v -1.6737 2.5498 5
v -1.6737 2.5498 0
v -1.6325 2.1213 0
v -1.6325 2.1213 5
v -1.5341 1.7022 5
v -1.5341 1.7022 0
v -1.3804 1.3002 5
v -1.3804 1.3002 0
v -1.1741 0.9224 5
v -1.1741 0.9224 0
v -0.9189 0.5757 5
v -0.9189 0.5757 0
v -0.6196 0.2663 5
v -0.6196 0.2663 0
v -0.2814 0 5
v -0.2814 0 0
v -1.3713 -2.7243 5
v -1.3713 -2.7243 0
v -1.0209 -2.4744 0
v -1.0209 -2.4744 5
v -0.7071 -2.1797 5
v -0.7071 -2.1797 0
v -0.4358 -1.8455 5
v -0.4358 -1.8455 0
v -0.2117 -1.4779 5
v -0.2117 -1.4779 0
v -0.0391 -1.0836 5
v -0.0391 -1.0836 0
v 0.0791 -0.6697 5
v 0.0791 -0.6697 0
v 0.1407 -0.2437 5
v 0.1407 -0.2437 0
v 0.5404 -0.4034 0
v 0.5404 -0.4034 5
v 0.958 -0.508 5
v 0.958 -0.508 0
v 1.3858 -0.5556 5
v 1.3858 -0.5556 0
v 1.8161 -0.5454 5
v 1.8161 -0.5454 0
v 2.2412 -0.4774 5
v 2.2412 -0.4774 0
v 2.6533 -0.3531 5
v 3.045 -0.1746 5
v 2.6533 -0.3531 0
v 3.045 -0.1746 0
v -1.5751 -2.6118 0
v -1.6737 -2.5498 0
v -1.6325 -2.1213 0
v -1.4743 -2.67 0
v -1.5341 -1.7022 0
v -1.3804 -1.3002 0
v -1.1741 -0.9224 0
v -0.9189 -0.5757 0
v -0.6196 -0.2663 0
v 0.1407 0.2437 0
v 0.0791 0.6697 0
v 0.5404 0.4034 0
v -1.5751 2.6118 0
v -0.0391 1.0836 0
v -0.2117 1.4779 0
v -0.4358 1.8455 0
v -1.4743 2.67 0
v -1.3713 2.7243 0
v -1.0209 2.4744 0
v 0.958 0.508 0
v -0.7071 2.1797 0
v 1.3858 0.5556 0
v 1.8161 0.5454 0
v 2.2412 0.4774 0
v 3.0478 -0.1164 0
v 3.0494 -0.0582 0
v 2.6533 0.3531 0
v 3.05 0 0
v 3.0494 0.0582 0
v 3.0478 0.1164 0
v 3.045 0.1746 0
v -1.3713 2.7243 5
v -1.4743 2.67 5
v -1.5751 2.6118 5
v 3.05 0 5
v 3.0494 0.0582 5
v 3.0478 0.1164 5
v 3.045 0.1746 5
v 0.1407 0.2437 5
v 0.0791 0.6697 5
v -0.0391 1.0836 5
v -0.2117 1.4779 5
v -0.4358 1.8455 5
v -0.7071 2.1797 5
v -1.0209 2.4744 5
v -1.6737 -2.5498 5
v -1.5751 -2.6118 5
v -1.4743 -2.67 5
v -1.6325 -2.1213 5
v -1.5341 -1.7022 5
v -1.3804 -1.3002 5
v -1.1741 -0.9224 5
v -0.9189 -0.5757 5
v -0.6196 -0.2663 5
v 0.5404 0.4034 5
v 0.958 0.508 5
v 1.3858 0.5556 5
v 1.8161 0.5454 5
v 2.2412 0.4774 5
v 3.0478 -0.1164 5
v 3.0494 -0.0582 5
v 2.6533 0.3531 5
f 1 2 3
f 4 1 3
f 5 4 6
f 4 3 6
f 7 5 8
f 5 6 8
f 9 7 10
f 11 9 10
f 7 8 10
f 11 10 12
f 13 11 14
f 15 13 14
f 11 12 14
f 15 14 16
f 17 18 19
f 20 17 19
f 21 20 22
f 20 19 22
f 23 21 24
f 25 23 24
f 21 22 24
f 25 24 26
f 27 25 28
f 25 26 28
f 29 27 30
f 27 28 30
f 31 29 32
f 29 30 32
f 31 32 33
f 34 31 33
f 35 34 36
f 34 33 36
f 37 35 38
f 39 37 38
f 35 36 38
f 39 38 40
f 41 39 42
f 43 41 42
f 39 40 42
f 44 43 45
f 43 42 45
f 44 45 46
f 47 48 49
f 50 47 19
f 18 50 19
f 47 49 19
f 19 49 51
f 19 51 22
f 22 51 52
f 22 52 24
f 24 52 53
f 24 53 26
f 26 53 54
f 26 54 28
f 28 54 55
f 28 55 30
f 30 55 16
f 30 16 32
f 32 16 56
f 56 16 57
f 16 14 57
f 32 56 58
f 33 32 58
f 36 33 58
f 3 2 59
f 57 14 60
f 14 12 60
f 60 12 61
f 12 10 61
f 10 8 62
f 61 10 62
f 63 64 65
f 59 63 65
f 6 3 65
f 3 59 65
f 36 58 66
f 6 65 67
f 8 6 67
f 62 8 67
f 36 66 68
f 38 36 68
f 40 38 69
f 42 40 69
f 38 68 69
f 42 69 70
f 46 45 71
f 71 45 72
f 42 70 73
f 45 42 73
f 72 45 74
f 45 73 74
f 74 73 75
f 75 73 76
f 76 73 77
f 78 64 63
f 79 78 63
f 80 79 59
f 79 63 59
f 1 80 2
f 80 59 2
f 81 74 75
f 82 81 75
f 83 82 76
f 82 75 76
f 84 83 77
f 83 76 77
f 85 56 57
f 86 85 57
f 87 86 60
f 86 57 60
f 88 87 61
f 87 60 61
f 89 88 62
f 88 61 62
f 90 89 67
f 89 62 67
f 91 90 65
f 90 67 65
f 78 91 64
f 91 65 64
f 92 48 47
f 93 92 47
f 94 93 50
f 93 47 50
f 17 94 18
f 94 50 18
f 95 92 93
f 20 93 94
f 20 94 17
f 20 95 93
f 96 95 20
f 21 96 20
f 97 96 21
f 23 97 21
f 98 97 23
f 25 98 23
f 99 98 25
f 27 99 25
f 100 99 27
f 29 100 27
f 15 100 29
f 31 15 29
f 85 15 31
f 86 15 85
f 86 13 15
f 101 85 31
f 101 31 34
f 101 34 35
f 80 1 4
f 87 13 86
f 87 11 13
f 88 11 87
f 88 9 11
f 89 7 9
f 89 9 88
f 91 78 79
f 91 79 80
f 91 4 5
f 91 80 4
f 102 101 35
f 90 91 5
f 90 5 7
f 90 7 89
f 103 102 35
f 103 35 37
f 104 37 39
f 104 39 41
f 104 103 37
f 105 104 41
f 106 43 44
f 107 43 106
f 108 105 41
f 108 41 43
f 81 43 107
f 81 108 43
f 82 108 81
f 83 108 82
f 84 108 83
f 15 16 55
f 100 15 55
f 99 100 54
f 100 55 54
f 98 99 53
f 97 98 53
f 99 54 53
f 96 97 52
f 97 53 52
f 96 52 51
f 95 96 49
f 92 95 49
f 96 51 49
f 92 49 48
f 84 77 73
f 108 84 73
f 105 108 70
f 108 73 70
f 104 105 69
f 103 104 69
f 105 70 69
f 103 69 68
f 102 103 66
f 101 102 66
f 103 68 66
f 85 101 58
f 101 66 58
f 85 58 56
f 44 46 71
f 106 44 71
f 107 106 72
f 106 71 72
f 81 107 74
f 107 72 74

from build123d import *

# Parameters (mm, degrees)
F1_DEPTH = 5


with BuildPart() as f1:
    # F0 (on Top) → F1 (new body)
    with BuildSketch(Plane.XY):
        with BuildLine():
            ThreePointArc((3.0449996355, -0.1745772603), (3.0487496526, -0.0873244288), (3.05, 0))
            ThreePointArc((3.05, 0), (3.0487496526, 0.0873244288), (3.0449996355, 0.1745772603))
            ThreePointArc((3.0449996355, 0.1745772603), (1.6011501733, 0.55771632), (0.140706095, 0.2437101054))
            ThreePointArc((0.140706095, 0.2437101054), (0.1476756796, 0.1219436265), (0.15, 0))
            ThreePointArc((0.15, 0), (0.1476756796, -0.1219436265), (0.140706095, -0.2437101054))
            ThreePointArc((0.140706095, -0.2437101054), (1.6011501733, -0.55771632), (3.0449996355, -0.1745772603))
        make_face()
        with BuildLine():
            ThreePointArc((0.140706095, 0.2437101054), (-0.3175785854, 1.6654948853), (-1.3713114754, 2.724335669))
            ThreePointArc((-1.3713114754, 2.724335669), (-1.525, 2.6413774815), (-1.6736881601, 2.5497584087))
            ThreePointArc((-1.6736881601, 2.5497584087), (-1.2835715879, 1.1077785653), (-0.28141219, 0))
            ThreePointArc((-0.28141219, 0), (-0.075, 0.1299038106), (0.140706095, 0.2437101054))
        make_face()
        with BuildLine():
            ThreePointArc((0.15, 0), (0.1476756796, 0.1219436265), (0.140706095, 0.2437101054))
            ThreePointArc((0.140706095, 0.2437101054), (-0.075, 0.1299038106), (-0.28141219, 0))
            ThreePointArc((-0.28141219, 0), (-0.075, -0.1299038106), (0.140706095, -0.2437101054))
            ThreePointArc((0.140706095, -0.2437101054), (0.1476756796, -0.1219436265), (0.15, 0))
        make_face()
        with BuildLine():
            ThreePointArc((-1.6736881601, -2.5497584087), (-1.525, -2.6413774815), (-1.3713114754, -2.724335669))
            ThreePointArc((-1.3713114754, -2.724335669), (-0.3175785854, -1.6654948853), (0.140706095, -0.2437101054))
            ThreePointArc((0.140706095, -0.2437101054), (-0.075, -0.1299038106), (-0.28141219, 0))
            ThreePointArc((-0.28141219, 0), (-1.2835715879, -1.1077785653), (-1.6736881601, -2.5497584087))
        make_face()
    extrude(amount=F1_DEPTH)


solid = f1.part
